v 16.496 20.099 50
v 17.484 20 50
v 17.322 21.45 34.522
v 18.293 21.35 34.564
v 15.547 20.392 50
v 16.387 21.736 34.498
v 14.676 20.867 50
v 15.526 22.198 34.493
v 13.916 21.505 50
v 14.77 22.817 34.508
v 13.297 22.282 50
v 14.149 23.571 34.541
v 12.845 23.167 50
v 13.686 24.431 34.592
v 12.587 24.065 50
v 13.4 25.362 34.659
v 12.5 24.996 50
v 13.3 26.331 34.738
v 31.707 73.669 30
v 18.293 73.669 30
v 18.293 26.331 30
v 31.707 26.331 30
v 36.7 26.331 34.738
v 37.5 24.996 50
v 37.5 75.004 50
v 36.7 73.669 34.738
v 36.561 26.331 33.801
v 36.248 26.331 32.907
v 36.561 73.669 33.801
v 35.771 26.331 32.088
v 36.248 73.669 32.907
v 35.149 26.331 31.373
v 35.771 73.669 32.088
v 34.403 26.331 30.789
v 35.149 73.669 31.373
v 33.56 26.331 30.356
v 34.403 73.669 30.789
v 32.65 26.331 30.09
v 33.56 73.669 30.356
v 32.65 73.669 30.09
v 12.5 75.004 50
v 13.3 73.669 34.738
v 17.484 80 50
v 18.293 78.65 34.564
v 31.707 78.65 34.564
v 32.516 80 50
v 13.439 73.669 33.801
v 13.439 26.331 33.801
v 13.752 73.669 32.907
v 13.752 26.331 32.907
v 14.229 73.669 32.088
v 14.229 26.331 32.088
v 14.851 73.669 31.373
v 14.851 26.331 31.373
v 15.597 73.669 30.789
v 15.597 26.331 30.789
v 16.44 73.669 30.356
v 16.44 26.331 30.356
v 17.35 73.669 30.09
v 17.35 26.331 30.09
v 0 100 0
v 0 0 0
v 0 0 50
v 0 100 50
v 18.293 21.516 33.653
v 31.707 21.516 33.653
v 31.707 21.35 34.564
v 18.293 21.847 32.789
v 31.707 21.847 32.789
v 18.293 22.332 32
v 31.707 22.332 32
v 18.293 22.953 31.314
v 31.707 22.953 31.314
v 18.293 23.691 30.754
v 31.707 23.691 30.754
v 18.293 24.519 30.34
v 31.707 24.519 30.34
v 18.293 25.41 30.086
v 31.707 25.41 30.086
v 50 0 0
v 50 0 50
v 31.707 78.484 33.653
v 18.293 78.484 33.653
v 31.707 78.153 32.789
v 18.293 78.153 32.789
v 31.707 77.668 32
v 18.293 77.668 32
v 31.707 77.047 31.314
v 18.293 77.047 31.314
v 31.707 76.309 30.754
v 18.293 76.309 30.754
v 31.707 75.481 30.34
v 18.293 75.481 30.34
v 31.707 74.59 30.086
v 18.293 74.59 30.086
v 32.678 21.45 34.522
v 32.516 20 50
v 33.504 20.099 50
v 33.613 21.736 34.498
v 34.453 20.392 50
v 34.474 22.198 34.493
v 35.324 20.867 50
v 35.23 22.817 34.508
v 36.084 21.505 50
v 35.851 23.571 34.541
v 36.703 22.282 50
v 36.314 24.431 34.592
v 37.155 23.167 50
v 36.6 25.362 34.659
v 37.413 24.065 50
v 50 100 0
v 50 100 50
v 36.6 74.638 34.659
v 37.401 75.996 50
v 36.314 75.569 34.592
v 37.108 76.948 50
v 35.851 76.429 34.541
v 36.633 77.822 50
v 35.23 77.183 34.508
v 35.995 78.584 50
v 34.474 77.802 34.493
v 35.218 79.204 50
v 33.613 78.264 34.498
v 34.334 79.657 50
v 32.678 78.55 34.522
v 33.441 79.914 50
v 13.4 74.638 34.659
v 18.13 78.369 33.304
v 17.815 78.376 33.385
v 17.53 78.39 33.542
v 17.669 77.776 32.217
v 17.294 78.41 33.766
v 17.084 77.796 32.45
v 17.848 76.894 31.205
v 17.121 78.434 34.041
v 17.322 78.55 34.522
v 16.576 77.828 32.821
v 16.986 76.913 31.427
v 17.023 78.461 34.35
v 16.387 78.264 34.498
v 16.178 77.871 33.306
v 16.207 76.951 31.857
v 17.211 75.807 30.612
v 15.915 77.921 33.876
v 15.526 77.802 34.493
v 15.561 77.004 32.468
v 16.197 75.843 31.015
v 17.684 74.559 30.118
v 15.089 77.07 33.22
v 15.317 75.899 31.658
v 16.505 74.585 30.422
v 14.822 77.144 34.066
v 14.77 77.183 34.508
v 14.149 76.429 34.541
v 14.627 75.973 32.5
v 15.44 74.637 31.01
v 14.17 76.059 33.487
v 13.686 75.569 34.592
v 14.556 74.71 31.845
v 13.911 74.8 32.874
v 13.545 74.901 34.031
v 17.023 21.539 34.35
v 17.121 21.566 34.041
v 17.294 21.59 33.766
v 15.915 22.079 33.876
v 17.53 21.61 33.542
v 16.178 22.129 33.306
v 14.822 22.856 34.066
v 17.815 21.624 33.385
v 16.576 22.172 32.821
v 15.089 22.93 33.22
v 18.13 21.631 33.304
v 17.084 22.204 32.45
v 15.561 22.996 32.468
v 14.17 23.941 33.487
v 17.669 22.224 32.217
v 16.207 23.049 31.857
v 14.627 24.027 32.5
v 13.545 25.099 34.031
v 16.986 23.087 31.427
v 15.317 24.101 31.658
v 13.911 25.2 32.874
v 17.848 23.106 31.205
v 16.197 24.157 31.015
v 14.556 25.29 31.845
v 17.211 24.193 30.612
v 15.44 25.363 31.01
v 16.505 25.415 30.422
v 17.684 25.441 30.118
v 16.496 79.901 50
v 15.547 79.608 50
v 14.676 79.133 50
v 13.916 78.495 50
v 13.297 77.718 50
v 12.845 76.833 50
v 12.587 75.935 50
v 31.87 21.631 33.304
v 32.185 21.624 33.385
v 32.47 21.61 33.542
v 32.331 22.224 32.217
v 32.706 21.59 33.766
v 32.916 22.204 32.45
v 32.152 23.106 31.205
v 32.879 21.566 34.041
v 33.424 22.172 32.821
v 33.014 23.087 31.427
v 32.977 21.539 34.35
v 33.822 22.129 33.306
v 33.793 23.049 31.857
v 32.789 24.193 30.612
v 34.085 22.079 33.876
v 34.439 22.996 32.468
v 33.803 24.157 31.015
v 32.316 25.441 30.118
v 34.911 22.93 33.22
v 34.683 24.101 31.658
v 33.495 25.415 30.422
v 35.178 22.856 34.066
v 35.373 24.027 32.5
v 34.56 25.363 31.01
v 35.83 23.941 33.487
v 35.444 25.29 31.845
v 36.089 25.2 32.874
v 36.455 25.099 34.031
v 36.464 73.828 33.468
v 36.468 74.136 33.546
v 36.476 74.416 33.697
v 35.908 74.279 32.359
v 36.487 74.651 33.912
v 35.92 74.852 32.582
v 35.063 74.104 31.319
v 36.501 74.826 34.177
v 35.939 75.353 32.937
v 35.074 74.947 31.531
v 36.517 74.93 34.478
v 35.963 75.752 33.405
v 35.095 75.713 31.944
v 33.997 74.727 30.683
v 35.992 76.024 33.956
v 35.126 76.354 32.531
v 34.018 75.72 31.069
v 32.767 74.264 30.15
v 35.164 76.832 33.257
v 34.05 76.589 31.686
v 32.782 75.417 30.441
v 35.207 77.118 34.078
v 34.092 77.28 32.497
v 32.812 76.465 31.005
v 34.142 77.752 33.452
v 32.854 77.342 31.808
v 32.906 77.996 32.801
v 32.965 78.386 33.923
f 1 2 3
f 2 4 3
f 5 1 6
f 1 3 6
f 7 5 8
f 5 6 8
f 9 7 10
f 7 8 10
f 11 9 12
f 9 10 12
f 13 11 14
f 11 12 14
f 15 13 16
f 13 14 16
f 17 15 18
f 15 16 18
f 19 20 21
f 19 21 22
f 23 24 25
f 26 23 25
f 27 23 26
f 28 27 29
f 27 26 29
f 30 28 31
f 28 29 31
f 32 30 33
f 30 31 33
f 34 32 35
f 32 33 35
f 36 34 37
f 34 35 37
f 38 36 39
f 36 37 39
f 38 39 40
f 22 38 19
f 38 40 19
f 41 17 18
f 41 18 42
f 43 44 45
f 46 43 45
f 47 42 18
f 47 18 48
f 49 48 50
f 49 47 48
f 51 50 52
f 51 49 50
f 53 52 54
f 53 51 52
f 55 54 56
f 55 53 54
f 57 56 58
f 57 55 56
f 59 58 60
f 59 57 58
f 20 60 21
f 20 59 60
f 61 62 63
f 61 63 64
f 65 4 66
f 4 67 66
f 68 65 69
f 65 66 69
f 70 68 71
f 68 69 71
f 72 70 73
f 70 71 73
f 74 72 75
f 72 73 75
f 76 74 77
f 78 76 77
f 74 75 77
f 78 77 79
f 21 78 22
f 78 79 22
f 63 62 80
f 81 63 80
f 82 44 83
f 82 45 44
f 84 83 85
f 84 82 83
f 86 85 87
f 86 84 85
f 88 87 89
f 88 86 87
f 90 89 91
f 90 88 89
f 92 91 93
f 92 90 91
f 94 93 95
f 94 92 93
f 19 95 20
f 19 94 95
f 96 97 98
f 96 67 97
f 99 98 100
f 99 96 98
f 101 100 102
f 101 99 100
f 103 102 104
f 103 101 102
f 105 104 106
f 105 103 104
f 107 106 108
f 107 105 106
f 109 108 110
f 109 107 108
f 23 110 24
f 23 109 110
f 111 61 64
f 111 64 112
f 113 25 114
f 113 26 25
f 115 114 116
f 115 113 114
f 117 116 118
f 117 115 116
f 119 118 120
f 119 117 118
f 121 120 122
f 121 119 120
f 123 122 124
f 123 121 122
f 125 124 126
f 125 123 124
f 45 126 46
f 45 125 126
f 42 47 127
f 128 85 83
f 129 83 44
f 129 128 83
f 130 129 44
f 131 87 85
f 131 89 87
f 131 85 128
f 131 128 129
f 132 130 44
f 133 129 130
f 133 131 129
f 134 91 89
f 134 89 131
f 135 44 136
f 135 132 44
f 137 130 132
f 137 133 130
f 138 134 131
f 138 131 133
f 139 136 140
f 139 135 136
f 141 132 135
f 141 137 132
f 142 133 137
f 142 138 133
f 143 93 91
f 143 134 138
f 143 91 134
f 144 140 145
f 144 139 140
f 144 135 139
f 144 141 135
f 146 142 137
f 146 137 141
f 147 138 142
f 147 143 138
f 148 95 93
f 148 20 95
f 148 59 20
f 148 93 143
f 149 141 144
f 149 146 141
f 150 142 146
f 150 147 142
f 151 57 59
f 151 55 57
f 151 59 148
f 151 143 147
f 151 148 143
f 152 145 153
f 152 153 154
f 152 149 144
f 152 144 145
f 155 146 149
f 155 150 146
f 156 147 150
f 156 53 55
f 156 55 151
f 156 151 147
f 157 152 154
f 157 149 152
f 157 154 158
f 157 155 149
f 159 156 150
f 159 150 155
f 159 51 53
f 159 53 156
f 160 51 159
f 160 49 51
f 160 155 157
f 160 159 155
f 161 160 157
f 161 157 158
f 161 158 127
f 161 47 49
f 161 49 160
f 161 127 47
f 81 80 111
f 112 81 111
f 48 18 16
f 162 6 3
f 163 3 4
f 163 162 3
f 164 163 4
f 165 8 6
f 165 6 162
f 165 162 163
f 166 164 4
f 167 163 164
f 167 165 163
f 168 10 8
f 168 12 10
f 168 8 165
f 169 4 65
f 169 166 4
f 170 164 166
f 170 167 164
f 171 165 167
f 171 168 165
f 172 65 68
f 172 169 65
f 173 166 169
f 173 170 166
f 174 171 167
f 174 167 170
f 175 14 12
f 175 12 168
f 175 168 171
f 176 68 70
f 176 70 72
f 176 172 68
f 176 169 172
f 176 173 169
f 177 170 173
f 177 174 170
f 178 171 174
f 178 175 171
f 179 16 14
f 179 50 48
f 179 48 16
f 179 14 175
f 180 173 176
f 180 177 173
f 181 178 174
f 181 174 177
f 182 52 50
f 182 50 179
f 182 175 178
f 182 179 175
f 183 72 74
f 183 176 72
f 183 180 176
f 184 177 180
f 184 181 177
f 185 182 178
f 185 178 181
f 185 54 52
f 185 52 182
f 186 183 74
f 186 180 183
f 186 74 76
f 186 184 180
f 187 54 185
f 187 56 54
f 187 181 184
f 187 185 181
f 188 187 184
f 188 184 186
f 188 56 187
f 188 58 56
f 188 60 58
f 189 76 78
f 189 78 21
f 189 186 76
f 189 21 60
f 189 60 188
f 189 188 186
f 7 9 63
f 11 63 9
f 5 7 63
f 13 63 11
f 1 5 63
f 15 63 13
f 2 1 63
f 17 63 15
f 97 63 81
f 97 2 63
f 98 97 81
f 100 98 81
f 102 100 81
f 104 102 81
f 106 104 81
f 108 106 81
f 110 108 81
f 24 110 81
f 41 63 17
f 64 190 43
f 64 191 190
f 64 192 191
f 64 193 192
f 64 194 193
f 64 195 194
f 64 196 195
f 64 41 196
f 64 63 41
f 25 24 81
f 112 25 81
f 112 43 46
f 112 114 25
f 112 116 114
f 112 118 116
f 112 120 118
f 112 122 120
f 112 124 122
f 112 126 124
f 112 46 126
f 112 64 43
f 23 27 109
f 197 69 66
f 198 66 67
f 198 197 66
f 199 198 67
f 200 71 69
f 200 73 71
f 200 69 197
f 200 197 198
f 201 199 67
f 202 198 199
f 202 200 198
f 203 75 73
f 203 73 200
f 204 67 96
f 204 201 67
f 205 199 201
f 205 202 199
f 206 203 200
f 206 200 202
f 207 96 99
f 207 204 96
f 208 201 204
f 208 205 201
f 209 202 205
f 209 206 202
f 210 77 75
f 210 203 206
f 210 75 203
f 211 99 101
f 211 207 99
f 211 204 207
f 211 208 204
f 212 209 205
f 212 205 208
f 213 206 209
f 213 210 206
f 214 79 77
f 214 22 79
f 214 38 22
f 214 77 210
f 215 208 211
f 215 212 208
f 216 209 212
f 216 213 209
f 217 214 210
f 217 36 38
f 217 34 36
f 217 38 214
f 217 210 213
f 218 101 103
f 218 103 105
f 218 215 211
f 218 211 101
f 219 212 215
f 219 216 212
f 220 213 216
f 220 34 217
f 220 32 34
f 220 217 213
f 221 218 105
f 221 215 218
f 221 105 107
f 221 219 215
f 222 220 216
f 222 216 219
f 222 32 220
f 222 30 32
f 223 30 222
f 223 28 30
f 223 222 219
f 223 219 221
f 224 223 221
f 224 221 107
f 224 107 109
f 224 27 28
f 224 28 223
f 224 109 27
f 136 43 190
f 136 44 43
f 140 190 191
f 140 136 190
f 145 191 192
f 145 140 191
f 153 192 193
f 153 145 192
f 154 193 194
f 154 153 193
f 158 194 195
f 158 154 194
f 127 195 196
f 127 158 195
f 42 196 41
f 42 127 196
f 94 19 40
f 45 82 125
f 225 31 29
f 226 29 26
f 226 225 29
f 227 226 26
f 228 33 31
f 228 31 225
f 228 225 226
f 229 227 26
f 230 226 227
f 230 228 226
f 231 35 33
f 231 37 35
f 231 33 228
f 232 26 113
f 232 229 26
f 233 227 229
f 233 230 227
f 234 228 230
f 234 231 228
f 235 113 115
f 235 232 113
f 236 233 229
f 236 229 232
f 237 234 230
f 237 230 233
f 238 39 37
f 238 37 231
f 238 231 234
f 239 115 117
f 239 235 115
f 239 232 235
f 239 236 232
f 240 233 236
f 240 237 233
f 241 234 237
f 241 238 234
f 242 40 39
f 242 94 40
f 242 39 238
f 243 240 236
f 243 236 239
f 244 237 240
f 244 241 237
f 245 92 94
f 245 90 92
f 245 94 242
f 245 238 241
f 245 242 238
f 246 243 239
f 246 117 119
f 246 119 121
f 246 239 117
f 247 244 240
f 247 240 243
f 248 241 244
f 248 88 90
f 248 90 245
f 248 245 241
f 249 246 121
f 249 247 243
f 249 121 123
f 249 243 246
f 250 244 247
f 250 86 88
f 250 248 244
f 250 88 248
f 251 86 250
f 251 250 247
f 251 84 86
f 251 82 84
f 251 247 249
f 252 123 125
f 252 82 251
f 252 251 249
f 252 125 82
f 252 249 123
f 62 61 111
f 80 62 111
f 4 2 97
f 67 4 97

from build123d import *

# Parameters (mm, degrees)
SKIZZE1_W                       = 50
SKIZZE1_H                       = 100
AUFSATZ_LINEAR_AUSTRAGEN1_DEPTH = 50
SKIZZE2_W                       = 25
SKIZZE2_H                       = 60
SCHNITT_LINEAR_AUSTRAGEN1_DEPTH = 20
FORMSCHR_GE1_ANGLE              = 3
FORMSCHR_GE2_ANGLE              = 5
VERRUNDUNG1_R                   = 5


with BuildPart() as part:
    # Skizze1 → Aufsatz-Linear austragen1 (new body)
    with BuildSketch(Plane.XY):
        with Locations((25, 50)):
            Rectangle(SKIZZE1_W, SKIZZE1_H)
    extrude(amount=AUFSATZ_LINEAR_AUSTRAGEN1_DEPTH)

    # Skizze2 → Schnitt-Linear austragen1 (cut)
    with BuildSketch(Plane.XY.offset(50)):
        with Locations((25, 50)):
            Rectangle(SKIZZE2_W, SKIZZE2_H)
    extrude(amount=-SCHNITT_LINEAR_AUSTRAGEN1_DEPTH, mode=Mode.SUBTRACT)

    # Formschräge1
    formschr_ge1_faces = [part.faces().sort_by_distance(p)[0] for p in [
        (37.5, 50, 40),
        (12.5, 50, 40),
    ]]
    draft(formschr_ge1_faces, Plane.XY.offset(50), FORMSCHR_GE1_ANGLE)

    # Formschräge2
    formschr_ge2_faces = [part.faces().sort_by_distance(p)[0] for p in [
        (25, 20, 40.14586985),
        (25, 80, 40.14586985),
    ]]
    draft(formschr_ge2_faces, Plane.XY.offset(50), FORMSCHR_GE2_ANGLE)

    # Verrundung1
    verrundung1_edges = [part.edges().sort_by_distance(p)[0] for p in [
        (13.548155586, 50, 30),
        (13.024077793, 20.874886635, 40),
        (25, 78.250226729, 30),
        (13.024077793, 79.125113365, 40),
        (36.451844414, 50, 30),
        (36.975922207, 79.125113365, 40),
        (25, 21.749773271, 30),
        (36.975922207, 20.874886635, 40),
    ]]
    fillet(verrundung1_edges, radius=VERRUNDUNG1_R)


solid = part.part
